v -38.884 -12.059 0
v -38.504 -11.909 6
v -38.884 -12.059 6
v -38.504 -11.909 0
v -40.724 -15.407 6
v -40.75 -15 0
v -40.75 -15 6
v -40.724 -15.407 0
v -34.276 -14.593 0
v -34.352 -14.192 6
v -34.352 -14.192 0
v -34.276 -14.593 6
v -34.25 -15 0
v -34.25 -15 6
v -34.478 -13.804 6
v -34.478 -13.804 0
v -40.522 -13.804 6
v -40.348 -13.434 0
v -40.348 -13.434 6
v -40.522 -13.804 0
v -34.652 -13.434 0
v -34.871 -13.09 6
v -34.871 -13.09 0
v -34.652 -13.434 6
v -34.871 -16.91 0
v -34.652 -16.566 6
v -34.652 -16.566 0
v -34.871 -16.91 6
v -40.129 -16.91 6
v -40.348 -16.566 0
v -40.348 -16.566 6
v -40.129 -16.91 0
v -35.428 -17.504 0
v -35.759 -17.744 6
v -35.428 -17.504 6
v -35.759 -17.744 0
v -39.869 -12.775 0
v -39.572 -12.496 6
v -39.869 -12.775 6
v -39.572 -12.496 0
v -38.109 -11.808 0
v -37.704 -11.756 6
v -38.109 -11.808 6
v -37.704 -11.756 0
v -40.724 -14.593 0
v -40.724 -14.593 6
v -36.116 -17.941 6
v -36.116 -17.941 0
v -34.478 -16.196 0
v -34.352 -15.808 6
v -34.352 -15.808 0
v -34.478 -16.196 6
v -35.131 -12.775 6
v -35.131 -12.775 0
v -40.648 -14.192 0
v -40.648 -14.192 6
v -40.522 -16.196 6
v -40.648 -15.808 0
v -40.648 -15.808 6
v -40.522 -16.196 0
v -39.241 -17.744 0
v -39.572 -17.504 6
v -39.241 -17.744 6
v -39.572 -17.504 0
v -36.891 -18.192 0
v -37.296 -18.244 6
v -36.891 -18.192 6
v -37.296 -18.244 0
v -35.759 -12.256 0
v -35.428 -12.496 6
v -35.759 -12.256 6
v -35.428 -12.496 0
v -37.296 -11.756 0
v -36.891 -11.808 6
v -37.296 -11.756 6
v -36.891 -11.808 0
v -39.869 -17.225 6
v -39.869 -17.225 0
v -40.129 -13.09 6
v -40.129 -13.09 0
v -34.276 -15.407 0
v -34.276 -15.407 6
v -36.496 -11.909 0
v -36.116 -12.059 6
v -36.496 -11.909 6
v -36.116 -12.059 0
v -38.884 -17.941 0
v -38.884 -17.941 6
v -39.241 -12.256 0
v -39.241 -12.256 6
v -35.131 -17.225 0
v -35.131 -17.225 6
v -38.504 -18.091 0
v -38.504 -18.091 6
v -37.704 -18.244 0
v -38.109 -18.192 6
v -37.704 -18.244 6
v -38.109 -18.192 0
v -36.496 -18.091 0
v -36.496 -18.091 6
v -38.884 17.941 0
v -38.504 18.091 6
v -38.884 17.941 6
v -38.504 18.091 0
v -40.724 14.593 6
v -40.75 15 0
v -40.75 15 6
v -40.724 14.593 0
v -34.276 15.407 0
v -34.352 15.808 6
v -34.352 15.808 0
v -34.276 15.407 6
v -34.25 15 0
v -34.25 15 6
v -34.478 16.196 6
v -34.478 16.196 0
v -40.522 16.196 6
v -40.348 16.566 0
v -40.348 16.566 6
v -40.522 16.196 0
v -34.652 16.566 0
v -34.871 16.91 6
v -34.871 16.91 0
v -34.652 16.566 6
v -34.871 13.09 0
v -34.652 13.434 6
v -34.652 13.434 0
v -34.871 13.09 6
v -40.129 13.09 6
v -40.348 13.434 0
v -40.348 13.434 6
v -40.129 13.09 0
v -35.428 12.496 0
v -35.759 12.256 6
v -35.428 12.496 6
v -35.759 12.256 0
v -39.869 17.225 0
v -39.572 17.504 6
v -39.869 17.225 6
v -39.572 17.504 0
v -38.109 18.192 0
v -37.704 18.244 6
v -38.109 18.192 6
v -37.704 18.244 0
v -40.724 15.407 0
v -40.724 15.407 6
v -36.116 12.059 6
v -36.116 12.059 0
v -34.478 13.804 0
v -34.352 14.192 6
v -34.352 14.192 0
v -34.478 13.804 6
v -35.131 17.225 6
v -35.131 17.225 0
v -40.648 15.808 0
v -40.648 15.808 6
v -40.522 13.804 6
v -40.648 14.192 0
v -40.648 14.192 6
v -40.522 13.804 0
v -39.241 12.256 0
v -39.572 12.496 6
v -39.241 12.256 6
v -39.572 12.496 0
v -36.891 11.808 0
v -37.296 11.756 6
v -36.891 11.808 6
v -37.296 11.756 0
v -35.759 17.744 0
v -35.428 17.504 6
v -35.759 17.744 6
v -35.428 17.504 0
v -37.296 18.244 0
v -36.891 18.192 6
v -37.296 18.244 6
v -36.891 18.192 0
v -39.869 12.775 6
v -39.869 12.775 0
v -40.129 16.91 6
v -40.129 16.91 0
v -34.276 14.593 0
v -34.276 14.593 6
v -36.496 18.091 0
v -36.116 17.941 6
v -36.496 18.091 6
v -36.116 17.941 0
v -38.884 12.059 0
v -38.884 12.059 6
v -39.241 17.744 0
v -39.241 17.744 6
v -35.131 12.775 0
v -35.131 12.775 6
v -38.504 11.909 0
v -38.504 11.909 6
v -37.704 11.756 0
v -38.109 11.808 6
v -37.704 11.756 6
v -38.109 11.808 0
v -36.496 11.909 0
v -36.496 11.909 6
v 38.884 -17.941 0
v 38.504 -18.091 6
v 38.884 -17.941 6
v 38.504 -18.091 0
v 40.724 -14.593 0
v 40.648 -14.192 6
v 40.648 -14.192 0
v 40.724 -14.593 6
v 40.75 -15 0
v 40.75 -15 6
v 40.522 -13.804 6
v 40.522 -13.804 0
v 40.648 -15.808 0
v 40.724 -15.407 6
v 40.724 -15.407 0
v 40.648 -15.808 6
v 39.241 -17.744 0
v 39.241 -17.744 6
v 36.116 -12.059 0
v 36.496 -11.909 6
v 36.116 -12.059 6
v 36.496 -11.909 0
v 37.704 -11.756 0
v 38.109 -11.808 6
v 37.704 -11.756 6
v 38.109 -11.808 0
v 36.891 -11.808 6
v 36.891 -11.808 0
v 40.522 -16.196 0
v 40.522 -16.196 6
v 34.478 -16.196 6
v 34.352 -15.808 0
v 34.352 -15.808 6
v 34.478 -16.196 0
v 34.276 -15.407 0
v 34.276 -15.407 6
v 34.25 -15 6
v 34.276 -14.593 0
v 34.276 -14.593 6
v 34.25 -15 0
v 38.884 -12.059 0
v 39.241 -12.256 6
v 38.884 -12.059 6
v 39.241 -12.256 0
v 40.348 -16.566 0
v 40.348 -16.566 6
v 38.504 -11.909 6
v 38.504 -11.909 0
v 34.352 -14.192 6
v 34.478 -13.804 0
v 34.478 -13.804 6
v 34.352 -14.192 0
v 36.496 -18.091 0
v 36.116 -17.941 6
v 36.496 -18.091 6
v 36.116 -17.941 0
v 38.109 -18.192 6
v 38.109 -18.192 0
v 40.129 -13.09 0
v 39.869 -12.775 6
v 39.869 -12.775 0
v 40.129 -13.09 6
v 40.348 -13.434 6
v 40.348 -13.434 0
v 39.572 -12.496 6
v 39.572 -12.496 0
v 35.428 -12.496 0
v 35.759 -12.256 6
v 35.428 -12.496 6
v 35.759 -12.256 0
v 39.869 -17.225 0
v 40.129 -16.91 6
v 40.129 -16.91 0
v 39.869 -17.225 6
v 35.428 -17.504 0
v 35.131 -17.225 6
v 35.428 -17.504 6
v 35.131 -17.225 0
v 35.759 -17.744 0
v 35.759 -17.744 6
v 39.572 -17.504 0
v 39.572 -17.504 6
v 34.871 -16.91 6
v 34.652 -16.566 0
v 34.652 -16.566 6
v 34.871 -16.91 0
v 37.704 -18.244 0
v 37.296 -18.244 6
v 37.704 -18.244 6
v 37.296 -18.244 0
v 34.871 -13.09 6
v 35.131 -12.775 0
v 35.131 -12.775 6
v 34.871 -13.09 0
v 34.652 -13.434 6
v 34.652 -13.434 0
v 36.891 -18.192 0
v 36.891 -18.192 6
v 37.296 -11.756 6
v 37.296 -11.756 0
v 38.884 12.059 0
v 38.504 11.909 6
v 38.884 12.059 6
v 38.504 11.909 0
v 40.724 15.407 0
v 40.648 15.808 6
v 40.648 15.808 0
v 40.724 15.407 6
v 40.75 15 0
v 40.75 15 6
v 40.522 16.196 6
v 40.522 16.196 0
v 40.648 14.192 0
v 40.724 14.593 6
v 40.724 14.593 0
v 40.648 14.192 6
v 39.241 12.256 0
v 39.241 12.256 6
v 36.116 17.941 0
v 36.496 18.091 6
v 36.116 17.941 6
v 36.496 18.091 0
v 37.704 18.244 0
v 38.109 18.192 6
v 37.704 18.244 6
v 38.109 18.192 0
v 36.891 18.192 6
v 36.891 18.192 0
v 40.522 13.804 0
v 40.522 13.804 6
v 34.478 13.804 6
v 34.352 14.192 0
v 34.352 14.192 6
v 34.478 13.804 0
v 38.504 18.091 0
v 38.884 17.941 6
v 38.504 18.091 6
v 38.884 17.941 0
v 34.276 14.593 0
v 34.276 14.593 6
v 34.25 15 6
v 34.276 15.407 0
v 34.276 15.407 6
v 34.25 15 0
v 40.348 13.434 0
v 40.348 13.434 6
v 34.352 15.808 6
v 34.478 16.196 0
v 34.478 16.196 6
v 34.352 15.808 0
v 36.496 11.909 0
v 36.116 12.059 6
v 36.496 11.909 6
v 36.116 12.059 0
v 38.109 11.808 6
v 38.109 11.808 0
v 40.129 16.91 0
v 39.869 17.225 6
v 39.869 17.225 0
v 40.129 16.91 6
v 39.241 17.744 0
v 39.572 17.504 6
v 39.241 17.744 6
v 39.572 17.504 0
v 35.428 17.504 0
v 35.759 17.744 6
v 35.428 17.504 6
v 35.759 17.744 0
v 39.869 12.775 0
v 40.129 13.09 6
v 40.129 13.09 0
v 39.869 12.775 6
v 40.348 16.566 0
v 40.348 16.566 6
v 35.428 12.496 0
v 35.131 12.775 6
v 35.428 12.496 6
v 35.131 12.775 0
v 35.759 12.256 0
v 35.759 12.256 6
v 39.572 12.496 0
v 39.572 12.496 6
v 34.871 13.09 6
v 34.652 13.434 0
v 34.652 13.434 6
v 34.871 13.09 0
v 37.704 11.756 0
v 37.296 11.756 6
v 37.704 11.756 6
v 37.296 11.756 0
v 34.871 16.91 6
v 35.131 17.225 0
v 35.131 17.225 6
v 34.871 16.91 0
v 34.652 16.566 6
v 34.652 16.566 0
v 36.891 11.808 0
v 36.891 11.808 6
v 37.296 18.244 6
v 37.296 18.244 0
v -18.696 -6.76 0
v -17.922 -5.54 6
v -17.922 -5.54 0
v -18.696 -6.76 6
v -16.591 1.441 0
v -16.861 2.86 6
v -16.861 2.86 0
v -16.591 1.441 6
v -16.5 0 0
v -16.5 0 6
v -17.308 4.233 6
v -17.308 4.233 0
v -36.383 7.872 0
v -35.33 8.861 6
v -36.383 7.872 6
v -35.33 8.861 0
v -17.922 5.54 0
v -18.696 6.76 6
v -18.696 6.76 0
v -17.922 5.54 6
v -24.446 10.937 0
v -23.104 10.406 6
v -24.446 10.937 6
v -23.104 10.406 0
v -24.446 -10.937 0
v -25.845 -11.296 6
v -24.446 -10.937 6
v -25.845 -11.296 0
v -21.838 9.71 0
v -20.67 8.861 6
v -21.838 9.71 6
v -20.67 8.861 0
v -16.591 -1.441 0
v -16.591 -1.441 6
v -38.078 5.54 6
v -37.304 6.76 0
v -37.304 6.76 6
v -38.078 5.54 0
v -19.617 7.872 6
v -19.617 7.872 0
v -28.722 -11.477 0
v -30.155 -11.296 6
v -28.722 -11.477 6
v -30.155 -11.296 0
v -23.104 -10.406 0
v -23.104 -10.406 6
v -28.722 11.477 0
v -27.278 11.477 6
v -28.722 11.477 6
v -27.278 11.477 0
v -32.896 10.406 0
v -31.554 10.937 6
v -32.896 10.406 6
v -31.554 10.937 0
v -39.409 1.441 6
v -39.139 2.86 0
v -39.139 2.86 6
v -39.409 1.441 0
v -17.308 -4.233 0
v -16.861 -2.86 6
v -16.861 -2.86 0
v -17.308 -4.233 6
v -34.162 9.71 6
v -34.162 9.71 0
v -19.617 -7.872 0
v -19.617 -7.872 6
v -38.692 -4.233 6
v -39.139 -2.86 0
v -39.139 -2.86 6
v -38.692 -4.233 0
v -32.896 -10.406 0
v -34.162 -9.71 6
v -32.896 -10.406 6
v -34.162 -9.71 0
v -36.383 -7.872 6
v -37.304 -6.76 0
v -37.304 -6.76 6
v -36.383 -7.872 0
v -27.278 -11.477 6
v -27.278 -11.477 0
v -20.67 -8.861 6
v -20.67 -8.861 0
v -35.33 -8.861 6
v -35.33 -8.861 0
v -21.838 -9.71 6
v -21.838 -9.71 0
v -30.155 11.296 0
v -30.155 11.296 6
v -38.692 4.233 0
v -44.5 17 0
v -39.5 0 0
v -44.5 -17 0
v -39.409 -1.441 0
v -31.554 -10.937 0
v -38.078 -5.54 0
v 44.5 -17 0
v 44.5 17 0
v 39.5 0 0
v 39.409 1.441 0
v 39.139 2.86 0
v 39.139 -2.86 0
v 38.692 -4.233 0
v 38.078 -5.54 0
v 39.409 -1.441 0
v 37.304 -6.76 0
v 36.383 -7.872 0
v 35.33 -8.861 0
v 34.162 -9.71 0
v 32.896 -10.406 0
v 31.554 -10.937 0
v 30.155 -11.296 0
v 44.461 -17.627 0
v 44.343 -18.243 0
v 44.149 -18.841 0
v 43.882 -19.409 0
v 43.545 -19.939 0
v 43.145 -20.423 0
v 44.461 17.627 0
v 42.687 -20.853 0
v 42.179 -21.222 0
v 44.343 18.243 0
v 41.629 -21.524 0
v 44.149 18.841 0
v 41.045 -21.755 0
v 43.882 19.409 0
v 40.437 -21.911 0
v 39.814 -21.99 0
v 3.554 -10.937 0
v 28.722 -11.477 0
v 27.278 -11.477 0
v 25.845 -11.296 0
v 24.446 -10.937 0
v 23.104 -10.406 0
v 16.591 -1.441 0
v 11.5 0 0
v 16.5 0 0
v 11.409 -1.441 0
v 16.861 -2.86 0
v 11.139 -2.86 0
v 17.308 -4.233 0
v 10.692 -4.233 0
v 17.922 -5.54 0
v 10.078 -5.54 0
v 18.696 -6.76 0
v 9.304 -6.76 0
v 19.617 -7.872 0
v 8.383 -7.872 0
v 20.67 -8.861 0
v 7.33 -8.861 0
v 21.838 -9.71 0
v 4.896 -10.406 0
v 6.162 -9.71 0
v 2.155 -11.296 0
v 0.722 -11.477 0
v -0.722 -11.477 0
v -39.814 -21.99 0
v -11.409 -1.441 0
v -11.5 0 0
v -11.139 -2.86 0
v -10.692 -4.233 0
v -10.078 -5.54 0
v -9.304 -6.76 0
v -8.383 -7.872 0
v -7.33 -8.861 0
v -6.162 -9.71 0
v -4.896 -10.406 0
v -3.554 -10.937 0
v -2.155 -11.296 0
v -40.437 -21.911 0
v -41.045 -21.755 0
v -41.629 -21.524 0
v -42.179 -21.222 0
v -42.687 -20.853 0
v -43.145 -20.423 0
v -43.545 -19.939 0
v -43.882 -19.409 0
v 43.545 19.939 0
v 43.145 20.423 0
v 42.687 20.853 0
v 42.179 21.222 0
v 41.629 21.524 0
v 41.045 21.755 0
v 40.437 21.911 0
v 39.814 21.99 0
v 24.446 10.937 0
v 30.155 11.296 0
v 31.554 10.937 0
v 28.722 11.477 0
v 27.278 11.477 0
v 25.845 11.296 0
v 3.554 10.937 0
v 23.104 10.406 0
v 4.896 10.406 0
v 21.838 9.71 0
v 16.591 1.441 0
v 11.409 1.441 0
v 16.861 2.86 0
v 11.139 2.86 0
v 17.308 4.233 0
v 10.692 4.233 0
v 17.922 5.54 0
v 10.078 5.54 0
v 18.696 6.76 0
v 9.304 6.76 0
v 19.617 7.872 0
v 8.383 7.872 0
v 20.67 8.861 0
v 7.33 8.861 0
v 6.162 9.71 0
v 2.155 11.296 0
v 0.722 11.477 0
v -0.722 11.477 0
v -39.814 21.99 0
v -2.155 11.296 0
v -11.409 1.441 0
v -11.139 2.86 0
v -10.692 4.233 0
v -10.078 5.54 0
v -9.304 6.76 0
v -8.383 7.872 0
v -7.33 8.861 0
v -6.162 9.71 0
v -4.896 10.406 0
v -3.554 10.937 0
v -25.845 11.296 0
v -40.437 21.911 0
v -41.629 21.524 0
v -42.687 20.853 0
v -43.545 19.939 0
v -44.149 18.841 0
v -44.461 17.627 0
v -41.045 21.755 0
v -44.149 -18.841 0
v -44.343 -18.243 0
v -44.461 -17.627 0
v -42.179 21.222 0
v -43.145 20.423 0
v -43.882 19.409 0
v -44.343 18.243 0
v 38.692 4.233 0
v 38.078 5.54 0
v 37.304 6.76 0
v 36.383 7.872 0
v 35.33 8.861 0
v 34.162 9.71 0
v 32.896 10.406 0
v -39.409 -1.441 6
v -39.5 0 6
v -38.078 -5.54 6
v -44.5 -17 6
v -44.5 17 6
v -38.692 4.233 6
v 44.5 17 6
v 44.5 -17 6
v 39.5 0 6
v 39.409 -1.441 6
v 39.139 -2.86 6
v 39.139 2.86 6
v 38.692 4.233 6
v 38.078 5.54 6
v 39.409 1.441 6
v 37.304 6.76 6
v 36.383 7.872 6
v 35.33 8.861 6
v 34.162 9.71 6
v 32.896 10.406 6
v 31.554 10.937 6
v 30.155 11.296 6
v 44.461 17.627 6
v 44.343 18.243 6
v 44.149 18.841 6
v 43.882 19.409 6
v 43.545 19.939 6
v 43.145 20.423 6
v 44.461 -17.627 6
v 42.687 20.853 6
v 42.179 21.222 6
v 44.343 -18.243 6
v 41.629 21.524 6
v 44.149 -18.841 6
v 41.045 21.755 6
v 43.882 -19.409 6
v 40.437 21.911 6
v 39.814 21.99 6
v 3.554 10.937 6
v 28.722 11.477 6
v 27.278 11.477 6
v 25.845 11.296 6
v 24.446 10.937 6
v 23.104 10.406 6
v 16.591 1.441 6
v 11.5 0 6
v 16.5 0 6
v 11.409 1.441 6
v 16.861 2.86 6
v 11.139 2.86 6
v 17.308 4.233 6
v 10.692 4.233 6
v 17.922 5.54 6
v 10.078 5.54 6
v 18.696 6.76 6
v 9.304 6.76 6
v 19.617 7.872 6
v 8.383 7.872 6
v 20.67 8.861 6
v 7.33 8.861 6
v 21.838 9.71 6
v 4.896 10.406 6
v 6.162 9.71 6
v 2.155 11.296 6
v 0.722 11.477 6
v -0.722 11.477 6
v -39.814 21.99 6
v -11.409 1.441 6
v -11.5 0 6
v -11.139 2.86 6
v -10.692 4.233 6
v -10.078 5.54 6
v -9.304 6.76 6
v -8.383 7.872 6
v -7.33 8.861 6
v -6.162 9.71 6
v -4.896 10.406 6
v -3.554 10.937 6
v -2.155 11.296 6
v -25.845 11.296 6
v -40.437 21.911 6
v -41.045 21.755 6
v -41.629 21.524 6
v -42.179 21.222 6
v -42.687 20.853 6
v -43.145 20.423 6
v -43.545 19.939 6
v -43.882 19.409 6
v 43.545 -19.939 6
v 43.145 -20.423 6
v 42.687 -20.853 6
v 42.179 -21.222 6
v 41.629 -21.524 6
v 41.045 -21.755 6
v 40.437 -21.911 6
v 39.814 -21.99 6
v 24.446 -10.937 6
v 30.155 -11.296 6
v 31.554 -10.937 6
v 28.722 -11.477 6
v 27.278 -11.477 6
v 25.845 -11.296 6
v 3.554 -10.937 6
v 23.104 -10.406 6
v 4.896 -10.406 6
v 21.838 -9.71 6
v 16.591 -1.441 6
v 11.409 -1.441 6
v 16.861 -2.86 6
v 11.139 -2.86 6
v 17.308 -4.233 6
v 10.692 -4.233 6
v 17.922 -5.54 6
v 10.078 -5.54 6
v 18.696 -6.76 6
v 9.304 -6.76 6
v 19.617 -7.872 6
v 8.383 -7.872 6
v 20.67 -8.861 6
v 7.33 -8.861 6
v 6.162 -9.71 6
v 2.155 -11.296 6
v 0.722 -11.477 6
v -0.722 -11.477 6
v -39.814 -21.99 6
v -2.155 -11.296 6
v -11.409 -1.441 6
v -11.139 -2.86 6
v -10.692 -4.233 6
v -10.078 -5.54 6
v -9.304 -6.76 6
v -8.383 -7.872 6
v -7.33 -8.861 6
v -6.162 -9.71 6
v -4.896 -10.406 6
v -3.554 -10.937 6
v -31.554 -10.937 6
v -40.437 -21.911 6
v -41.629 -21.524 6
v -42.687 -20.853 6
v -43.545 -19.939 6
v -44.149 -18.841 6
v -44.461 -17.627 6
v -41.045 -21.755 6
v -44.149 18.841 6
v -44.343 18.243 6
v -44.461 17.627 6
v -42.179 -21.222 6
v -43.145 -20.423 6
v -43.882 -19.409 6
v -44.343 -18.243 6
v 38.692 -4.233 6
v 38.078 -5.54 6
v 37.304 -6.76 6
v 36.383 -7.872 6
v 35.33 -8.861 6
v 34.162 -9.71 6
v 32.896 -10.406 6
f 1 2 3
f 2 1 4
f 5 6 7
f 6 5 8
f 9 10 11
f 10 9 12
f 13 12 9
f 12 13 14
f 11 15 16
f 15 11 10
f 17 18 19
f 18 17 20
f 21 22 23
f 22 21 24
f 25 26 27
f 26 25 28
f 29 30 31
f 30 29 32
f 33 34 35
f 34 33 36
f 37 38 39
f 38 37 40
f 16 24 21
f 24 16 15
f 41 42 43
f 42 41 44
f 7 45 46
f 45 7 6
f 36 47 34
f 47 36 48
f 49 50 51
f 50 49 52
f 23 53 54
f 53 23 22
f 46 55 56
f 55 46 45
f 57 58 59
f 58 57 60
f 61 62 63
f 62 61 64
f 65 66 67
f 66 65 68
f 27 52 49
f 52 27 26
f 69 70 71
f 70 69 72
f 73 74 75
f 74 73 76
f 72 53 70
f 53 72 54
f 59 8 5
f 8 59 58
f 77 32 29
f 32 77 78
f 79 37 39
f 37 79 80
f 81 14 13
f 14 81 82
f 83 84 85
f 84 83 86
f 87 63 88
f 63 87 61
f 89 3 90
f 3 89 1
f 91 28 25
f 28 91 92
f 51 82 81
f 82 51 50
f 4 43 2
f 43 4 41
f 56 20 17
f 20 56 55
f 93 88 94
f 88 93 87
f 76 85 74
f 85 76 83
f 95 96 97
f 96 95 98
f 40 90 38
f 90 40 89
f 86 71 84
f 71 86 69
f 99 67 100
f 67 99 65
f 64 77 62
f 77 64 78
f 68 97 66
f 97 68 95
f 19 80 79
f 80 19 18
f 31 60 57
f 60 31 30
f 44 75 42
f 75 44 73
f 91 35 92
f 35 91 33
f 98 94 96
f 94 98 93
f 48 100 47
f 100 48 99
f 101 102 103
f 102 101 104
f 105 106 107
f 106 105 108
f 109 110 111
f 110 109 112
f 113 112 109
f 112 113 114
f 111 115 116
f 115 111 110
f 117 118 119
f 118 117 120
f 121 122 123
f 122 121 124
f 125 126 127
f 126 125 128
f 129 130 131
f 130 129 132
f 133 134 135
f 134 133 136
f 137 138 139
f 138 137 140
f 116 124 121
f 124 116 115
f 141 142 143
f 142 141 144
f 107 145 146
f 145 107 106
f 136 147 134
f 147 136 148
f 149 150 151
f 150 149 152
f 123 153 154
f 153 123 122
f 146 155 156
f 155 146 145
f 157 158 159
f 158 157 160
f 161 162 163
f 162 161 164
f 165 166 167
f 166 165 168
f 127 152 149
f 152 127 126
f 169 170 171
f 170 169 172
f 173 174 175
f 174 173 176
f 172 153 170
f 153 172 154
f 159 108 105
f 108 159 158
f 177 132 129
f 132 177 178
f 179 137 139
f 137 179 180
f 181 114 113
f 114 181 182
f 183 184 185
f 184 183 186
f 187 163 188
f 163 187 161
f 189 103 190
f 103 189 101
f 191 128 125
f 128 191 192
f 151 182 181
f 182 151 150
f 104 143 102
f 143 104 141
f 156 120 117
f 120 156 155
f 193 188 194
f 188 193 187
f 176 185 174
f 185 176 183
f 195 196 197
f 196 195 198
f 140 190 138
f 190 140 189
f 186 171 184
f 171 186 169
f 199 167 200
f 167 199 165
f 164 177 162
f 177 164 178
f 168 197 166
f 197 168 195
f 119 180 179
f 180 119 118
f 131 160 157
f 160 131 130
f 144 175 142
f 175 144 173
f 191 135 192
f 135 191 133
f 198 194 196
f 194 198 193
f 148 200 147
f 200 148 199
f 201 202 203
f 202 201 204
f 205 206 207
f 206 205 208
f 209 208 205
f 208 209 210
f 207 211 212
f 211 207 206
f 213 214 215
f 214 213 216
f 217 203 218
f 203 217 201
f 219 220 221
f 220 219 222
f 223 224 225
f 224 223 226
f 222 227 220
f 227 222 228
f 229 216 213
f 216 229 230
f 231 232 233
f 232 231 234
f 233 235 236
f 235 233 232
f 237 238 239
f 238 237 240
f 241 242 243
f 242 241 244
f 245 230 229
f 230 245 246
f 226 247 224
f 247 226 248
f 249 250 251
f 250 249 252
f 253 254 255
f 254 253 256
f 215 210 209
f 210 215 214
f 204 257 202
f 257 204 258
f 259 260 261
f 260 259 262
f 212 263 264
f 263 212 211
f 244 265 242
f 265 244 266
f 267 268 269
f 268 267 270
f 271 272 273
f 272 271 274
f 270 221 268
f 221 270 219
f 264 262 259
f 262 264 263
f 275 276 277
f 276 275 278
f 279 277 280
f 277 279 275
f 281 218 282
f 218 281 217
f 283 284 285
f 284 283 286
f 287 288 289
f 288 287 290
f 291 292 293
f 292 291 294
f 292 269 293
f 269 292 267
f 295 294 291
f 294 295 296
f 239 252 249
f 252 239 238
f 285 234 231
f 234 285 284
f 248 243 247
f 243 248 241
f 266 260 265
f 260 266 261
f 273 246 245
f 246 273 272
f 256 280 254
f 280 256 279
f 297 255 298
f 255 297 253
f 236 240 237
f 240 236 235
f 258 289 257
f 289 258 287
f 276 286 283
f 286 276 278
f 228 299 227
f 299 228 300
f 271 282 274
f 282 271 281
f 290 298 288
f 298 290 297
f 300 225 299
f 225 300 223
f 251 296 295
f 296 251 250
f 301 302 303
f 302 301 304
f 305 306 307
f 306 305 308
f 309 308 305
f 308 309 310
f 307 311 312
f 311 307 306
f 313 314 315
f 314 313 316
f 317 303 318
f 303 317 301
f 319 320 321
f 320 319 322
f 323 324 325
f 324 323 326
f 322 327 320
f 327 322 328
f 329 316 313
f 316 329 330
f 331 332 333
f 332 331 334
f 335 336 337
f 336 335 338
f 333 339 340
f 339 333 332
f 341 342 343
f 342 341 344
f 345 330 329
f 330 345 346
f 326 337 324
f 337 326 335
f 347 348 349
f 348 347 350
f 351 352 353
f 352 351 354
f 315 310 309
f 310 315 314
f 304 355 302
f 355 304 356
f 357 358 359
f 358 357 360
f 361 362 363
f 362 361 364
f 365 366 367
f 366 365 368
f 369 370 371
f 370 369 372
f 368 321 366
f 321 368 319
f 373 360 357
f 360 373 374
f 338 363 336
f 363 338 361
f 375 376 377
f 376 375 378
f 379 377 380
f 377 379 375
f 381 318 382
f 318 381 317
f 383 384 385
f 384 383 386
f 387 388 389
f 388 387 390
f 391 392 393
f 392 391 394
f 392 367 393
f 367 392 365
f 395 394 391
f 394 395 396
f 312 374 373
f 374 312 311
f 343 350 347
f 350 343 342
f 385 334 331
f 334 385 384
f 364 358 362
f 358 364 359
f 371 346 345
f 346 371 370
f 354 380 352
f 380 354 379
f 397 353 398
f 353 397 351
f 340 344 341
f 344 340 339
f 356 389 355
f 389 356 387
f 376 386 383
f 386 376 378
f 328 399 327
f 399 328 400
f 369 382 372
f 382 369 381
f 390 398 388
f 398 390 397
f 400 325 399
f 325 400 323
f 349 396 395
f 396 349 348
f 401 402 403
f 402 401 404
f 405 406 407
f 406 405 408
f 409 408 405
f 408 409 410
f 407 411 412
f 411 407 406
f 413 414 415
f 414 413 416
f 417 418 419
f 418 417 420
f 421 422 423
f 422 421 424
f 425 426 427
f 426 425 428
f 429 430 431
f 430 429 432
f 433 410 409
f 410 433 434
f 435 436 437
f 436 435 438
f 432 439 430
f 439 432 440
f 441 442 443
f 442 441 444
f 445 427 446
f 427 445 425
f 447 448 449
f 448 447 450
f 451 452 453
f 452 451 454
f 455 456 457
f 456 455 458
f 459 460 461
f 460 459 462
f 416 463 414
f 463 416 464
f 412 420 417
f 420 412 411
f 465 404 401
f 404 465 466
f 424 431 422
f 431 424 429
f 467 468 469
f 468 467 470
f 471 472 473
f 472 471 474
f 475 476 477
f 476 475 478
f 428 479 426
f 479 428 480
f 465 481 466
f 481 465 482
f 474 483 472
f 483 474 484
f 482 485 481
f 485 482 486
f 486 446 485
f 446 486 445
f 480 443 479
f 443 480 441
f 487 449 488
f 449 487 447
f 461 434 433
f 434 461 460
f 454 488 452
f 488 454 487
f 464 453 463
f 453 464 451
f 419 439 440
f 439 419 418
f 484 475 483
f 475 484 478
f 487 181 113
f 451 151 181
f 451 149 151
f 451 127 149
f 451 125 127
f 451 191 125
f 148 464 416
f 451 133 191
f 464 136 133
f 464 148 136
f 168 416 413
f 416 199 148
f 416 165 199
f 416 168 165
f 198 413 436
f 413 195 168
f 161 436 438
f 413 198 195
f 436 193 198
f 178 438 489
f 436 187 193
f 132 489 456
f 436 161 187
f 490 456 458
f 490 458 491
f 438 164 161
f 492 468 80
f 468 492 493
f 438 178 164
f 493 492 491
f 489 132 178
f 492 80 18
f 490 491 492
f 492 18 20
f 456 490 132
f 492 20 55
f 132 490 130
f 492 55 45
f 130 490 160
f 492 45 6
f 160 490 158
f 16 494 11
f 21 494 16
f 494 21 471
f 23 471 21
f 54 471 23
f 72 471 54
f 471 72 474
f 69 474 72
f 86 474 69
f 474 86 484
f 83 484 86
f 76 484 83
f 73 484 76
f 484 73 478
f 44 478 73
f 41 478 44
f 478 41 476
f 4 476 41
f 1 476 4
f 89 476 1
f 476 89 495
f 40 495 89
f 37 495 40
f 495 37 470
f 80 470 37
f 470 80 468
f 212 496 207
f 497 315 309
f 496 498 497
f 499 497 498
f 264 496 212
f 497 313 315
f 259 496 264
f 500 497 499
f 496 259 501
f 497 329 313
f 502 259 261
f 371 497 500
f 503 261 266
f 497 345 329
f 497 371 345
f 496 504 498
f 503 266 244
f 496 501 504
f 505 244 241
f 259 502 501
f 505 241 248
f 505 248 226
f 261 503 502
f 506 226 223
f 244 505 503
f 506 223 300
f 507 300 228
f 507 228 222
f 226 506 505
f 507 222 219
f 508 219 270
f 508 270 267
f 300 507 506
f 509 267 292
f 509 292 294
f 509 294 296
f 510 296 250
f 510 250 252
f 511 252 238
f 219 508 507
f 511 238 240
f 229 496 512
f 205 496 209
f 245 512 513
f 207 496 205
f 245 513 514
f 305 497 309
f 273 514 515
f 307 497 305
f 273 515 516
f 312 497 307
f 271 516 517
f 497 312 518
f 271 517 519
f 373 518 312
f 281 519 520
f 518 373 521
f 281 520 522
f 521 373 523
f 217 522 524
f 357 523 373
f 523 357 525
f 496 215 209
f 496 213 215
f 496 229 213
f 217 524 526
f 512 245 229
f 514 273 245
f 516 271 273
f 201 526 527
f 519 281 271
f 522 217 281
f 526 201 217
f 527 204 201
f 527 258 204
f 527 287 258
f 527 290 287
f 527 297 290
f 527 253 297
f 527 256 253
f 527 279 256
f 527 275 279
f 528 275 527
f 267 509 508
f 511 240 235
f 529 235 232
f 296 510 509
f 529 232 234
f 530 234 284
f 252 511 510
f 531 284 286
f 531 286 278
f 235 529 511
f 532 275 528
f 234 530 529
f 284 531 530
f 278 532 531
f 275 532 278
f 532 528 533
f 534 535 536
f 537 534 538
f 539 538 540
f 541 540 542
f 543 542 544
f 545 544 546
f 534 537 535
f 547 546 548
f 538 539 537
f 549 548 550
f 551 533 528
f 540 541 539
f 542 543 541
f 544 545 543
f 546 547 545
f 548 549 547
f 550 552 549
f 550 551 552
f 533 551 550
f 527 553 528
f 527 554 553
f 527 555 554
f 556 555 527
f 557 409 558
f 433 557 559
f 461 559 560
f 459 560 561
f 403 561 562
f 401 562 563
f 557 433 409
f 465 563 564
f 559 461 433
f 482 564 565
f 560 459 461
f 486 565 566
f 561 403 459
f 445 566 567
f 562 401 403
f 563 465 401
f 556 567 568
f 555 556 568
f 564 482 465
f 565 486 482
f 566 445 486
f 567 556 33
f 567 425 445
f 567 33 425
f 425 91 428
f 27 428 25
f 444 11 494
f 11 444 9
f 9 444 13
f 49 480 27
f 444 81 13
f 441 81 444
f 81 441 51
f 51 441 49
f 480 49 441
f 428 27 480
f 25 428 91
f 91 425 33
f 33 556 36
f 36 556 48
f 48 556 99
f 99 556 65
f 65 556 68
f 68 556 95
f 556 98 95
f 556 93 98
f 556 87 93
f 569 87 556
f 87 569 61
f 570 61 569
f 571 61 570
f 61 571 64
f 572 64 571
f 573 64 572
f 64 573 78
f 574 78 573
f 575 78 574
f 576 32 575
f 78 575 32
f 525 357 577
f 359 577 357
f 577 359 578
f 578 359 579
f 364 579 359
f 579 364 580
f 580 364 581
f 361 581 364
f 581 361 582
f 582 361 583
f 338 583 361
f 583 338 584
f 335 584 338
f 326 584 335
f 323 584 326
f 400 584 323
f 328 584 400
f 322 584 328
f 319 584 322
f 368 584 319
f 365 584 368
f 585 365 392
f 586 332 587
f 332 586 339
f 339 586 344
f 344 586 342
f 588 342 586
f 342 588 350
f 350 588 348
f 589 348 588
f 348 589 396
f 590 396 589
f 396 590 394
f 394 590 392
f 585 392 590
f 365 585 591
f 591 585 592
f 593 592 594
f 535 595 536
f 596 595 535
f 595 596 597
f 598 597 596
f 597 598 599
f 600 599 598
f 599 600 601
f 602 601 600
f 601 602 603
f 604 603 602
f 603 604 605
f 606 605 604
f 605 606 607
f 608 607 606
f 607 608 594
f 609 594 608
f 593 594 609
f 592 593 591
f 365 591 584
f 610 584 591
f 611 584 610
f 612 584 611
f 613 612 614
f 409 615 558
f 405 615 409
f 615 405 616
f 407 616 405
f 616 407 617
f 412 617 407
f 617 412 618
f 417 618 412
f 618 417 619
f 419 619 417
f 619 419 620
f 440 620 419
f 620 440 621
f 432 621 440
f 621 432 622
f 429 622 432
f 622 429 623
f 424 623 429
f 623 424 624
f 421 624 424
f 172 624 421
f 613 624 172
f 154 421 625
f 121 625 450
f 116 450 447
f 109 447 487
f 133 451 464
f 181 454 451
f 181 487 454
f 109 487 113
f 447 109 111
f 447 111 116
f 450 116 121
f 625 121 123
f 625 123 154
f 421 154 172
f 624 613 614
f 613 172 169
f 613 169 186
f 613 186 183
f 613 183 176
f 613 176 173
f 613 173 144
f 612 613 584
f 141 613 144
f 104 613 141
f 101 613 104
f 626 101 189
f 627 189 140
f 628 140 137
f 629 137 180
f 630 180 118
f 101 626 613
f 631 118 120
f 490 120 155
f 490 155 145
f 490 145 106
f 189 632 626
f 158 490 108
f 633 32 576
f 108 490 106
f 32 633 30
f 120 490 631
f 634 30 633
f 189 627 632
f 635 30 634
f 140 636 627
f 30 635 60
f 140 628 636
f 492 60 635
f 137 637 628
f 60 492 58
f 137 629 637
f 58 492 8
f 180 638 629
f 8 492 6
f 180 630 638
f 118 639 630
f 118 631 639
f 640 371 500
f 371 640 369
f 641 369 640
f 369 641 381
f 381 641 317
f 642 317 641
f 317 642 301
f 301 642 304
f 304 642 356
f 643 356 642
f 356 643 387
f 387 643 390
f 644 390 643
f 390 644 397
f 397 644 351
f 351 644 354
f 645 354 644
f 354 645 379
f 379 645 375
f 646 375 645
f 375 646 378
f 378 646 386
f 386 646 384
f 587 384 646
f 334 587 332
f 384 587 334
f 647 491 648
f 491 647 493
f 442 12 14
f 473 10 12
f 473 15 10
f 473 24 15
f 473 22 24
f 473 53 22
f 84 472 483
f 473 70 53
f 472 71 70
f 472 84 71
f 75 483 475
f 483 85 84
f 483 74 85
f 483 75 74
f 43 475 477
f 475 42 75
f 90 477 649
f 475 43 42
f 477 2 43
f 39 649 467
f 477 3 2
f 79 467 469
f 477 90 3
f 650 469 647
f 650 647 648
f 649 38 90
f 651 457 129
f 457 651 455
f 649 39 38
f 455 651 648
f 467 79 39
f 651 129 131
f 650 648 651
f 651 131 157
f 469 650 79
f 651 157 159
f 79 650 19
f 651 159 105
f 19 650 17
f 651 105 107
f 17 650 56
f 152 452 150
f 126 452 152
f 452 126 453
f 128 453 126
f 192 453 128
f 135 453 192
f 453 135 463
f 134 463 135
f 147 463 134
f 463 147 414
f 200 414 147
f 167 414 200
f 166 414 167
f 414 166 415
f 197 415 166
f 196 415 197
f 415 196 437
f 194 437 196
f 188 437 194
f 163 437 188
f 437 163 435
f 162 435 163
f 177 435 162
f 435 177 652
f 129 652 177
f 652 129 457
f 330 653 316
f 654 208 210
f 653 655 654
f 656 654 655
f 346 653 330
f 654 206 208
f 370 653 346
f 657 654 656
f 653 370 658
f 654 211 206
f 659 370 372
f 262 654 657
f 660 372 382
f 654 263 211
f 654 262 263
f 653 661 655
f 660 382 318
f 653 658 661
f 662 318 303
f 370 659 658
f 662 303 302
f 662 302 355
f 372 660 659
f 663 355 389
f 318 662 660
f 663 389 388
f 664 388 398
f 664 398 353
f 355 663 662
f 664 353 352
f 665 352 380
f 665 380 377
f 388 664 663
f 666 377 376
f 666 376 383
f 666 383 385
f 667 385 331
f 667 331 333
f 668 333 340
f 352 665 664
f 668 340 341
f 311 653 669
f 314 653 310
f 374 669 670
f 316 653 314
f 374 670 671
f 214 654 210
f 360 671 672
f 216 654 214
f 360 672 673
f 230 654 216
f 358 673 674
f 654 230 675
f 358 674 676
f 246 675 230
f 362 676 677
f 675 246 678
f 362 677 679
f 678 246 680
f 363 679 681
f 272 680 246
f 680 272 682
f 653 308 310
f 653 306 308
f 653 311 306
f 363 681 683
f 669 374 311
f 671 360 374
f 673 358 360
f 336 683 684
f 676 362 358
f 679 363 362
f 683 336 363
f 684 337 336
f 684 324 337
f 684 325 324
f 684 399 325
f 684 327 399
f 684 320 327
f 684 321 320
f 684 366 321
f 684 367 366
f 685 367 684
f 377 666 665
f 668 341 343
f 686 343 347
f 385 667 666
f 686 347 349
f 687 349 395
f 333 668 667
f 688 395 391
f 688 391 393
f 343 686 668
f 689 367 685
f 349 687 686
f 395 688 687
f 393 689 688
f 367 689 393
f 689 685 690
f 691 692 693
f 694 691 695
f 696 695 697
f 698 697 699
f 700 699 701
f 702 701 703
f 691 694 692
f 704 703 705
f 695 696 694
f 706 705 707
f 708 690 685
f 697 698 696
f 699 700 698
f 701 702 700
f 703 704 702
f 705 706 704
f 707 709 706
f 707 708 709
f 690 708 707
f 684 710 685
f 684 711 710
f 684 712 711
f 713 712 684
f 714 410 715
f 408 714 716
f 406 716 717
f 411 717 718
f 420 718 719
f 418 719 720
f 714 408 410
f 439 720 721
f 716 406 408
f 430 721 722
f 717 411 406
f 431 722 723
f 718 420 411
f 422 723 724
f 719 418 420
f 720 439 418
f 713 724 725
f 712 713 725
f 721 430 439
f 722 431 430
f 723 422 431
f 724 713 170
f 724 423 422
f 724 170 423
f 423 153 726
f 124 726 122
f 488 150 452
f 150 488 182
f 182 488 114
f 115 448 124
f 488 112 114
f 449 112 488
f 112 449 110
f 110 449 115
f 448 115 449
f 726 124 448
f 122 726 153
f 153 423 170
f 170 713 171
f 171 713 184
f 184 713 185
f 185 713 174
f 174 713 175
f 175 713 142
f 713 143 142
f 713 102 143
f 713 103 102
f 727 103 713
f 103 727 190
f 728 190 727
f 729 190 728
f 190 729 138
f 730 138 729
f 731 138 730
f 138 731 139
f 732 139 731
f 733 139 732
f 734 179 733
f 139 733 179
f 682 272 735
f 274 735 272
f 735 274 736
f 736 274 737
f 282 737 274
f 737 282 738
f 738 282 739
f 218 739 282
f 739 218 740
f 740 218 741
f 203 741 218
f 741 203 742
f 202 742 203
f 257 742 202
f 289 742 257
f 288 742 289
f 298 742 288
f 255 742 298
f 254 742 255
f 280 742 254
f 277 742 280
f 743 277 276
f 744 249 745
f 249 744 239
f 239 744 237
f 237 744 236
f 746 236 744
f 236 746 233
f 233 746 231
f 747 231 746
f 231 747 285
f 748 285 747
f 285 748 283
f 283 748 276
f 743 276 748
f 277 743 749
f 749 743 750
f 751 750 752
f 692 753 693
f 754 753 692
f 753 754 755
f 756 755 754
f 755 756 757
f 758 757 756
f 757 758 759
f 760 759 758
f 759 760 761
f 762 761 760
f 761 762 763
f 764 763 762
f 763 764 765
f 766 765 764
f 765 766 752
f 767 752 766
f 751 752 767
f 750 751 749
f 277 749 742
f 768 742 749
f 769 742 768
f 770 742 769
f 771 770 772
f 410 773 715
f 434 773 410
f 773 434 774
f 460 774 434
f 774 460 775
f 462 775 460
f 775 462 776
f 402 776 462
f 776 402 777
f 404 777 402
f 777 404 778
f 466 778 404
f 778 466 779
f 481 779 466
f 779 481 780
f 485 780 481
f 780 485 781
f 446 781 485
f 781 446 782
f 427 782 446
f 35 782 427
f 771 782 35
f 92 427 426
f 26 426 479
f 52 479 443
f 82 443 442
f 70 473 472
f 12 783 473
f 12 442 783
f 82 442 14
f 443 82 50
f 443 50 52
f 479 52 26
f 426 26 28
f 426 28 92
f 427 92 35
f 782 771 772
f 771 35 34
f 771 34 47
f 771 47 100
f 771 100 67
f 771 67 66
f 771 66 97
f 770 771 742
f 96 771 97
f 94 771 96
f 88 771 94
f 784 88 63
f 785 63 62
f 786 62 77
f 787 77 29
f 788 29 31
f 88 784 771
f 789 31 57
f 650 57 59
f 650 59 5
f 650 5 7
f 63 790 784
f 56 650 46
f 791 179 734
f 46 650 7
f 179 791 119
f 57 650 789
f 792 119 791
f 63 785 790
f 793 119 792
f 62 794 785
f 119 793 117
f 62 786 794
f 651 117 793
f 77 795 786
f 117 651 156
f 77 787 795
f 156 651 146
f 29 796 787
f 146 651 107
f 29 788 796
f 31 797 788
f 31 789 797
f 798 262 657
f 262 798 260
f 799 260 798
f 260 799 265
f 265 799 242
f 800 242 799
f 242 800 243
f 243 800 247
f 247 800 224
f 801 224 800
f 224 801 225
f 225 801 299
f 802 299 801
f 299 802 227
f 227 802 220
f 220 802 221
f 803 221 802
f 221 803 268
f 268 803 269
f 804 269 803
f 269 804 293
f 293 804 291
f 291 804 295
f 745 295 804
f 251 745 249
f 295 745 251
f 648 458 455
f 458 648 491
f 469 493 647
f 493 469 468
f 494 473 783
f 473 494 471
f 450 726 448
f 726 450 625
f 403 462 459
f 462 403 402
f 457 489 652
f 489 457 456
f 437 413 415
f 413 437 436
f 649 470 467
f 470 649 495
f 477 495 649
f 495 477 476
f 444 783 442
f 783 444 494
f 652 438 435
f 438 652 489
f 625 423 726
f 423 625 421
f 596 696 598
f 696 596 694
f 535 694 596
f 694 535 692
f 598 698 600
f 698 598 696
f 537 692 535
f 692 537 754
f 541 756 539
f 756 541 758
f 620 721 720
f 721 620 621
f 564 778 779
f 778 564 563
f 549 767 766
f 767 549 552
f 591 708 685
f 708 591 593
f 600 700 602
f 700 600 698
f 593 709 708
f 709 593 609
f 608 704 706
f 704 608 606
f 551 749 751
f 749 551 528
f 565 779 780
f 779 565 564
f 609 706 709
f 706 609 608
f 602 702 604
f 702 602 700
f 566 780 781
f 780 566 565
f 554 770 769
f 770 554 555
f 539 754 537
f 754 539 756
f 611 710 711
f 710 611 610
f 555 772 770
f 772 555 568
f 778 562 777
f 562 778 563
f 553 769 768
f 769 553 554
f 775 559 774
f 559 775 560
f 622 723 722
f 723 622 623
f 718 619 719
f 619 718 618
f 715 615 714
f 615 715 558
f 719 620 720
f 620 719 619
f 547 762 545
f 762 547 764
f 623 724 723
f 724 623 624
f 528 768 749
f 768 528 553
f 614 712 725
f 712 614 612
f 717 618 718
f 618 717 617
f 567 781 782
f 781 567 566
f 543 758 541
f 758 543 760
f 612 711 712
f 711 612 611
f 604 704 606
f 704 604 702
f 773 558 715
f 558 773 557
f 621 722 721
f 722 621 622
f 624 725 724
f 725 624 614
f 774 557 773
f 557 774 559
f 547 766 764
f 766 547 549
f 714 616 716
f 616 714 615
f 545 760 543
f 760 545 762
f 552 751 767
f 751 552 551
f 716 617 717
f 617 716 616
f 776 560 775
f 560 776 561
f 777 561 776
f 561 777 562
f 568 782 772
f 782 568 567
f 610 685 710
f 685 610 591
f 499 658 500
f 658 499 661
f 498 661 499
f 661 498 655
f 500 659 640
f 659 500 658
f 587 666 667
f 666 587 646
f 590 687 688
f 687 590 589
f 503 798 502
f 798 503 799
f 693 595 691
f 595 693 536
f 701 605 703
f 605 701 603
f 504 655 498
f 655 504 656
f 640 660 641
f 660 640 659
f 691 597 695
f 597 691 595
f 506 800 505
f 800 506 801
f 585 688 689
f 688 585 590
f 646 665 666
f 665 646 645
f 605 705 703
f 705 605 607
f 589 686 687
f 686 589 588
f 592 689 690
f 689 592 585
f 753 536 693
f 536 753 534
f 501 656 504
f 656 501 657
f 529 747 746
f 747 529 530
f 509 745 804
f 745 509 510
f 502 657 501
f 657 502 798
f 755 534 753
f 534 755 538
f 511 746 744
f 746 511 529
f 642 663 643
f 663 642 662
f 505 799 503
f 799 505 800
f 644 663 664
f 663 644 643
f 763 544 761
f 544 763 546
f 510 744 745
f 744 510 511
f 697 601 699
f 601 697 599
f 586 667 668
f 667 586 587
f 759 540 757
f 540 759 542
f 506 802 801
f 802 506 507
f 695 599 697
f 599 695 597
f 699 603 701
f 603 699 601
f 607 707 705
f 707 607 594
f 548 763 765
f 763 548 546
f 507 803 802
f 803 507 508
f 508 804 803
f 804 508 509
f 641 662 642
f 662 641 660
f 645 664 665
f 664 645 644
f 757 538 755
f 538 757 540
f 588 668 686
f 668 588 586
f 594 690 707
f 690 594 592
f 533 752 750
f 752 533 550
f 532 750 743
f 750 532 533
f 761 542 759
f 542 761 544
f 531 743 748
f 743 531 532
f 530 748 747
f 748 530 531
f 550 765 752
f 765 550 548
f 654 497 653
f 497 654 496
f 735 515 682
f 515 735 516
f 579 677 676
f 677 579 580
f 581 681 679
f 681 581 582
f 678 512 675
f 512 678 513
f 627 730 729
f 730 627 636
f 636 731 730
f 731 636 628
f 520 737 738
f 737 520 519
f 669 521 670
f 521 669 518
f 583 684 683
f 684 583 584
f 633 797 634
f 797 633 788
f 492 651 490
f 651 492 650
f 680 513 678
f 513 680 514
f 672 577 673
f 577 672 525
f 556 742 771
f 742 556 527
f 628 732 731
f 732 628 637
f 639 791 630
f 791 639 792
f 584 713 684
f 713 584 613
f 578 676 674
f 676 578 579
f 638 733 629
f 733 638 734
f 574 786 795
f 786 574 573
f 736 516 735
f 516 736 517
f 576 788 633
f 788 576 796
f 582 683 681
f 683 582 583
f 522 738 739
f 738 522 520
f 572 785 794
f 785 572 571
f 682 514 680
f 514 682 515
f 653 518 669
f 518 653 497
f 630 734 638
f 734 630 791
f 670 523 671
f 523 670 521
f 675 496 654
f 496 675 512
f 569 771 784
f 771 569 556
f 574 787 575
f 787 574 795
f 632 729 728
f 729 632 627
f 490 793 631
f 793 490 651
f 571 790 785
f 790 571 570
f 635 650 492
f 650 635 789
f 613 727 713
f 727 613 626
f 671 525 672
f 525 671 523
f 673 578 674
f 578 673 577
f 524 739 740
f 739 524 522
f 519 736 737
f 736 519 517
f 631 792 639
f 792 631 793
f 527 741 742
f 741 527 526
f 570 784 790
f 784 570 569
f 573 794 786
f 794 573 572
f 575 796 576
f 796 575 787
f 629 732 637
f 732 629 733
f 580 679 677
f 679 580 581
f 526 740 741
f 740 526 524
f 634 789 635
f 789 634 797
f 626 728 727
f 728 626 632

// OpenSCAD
$fn = 50;


difference() {
	union() {
		hull() {
			translate(v = [-39.5000000000, 17.0000000000, 0]) {
				cylinder(h = 6, r = 5);
			}
			translate(v = [39.5000000000, 17.0000000000, 0]) {
				cylinder(h = 6, r = 5);
			}
			translate(v = [-39.5000000000, -17.0000000000, 0]) {
				cylinder(h = 6, r = 5);
			}
			translate(v = [39.5000000000, -17.0000000000, 0]) {
				cylinder(h = 6, r = 5);
			}
		}
	}
	union() {
		#translate(v = [-37.5000000000, -15.0000000000, -100.0000000000]) {
			cylinder(h = 200, r = 3.2500000000);
		}
		#translate(v = [-37.5000000000, 15.0000000000, -100.0000000000]) {
			cylinder(h = 200, r = 3.2500000000);
		}
		#translate(v = [37.5000000000, -15.0000000000, -100.0000000000]) {
			cylinder(h = 200, r = 3.2500000000);
		}
		#translate(v = [37.5000000000, 15.0000000000, -100.0000000000]) {
			cylinder(h = 200, r = 3.2500000000);
		}
		#translate(v = [-28.0000000000, 0, 0]) {
			cylinder(h = 6, r = 11.5000000000);
		}
		#cylinder(h = 6, r = 11.5000000000);
		#translate(v = [28.0000000000, 0, 0]) {
			cylinder(h = 6, r = 11.5000000000);
		}
	}
}
